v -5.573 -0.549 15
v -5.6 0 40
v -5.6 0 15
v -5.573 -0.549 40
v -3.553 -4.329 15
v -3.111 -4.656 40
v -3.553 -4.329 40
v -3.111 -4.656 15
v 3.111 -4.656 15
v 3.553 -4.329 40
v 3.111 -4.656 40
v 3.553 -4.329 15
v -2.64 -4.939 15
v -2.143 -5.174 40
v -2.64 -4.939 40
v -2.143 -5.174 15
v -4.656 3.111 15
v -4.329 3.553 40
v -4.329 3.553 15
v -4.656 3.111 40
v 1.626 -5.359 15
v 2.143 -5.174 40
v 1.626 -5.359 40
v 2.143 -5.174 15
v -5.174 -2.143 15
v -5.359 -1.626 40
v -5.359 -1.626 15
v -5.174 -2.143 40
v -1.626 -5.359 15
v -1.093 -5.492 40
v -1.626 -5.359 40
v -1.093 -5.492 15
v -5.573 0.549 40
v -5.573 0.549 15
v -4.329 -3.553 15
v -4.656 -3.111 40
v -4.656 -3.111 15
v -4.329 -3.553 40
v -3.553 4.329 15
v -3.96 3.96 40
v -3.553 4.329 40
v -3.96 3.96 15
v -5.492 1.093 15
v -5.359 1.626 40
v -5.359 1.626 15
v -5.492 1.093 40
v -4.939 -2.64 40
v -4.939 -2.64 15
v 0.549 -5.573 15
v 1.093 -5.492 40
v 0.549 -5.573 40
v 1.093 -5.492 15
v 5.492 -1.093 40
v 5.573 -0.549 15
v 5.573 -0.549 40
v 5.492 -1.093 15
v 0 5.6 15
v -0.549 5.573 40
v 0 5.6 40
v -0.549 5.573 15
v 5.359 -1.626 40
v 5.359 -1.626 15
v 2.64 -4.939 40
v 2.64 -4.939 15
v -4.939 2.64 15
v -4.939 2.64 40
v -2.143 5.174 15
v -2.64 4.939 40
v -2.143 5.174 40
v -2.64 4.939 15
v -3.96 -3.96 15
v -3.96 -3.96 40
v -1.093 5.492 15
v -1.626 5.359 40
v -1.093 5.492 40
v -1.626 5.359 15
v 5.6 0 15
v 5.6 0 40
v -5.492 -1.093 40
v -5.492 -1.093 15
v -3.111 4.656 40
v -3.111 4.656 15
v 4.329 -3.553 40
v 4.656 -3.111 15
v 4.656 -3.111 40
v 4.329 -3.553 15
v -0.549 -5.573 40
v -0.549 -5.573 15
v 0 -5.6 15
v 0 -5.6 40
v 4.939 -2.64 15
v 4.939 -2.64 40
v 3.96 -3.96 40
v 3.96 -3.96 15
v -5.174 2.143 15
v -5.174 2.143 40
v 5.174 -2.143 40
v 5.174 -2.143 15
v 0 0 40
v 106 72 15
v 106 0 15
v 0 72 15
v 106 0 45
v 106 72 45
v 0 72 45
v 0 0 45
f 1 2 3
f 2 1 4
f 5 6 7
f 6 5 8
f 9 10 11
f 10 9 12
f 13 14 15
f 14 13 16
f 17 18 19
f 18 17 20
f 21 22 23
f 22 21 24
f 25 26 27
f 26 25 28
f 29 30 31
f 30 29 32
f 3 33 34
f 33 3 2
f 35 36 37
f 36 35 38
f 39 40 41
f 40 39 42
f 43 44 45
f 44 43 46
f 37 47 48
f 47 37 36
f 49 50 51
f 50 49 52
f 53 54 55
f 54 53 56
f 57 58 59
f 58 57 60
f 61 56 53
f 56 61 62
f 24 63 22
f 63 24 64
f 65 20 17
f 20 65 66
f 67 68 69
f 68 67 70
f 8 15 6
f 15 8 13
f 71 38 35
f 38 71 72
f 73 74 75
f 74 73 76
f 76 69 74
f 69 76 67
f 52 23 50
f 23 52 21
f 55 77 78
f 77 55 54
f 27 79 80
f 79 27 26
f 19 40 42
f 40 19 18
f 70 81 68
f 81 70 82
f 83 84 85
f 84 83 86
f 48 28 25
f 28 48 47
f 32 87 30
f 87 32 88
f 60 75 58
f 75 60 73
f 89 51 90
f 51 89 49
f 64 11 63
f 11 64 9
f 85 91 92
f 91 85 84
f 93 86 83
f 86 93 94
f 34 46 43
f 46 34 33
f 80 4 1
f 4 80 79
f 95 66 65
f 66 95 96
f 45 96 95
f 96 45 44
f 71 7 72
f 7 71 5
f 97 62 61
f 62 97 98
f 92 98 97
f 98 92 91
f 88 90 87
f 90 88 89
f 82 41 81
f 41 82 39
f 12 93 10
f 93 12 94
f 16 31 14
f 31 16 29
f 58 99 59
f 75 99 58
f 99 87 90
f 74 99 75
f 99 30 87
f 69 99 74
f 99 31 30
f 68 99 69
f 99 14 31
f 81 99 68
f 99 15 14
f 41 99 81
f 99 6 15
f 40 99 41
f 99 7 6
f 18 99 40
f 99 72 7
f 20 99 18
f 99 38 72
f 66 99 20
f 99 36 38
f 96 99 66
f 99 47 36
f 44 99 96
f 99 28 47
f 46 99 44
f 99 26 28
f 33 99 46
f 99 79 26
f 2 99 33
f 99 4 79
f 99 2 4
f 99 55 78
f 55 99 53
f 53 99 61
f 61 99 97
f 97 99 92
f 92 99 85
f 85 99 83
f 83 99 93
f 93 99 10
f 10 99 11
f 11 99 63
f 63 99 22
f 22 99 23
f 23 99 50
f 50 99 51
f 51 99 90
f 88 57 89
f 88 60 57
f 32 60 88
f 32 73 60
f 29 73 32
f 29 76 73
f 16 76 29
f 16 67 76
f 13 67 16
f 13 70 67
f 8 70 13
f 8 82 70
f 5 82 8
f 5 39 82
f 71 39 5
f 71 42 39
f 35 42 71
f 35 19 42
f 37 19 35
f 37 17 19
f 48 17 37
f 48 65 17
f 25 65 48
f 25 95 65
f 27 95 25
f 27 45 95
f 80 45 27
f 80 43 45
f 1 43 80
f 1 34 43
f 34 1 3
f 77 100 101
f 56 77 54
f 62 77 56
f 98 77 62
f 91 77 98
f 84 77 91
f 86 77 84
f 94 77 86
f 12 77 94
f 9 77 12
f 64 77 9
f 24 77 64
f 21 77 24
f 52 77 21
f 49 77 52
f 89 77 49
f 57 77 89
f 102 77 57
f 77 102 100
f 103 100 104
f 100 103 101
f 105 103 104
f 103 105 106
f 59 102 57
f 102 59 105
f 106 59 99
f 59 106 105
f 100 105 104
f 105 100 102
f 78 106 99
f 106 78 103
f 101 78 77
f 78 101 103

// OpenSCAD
// Bench Rack for 1.5 mL Microcentrifuge Tubes
// Dimensions based on user specifications

// Block Dimensions
BLOCK_LENGTH_X = 106; // mm
BLOCK_WIDTH_Y = 72;   // mm
BLOCK_HEIGHT_Z = 30;  // mm

// Grid Configuration
NUM_ROWS_Y = 4;       // Rows along Y
NUM_COLS_X = 6;       // Columns along X
GRID_SPACING_X = 16;  // mm centre-to-centre
GRID_SPACING_Y = 16;  // mm centre-to-centre

// Hole Dimensions
HOLE_DIAMETER = 11.2; // mm
HOLE_DEPTH = 25;      // mm (open top, closed bottom)
FLOOR_HEIGHT = 5;     // mm (solid floor at bottom)

// Tolerance for cutting operations (to ensure clean removal)
CUT_TOLERANCE = 0.1;  // mm

// Set global faceting for smooth curves
$fn = 64;

// Calculate grid offsets to center the grid on the block
// Total span X = (NUM_COLS_X - 1) * GRID_SPACING_X
// Offset X = (BLOCK_LENGTH_X - Total span X) / 2
GRID_OFFSET_X = (BLOCK_LENGTH_X - (NUM_COLS_X - 1) * GRID_SPACING_X) / 2;

// Total span Y = (NUM_ROWS_Y - 1) * GRID_SPACING_Y
// Offset Y = (BLOCK_WIDTH_Y - Total span Y) / 2
GRID_OFFSET_Y = (BLOCK_WIDTH_Y - (NUM_ROWS_Y - 1) * GRID_SPACING_Y) / 2;

// Main Block
difference() {
    // Create the solid rectangular block
    // Translate to ensure bottom is at Z=0
    translate([0, 0, BLOCK_HEIGHT_Z / 2]) {
        cube([BLOCK_LENGTH_X, BLOCK_WIDTH_Y, BLOCK_HEIGHT_Z]);
        
        // Create holes
        // We use a loop to generate cylinders that cut through the block
        for (r = [0 : NUM_ROWS_Y - 1]) {
            for (c = [0 : NUM_COLS_X - 1]) {
                // Calculate position of each hole center
                pos_x = GRID_OFFSET_X + c * GRID_SPACING_X;
                pos_y = GRID_OFFSET_Y + r * GRID_SPACING_Y;
                
                // Define the cutting cylinder
                // Radius is half diameter
                // Height is exactly the required hole depth (25mm)
                // Z position: Top of cylinder at block top (BLOCK_HEIGHT_Z / 2)
                // Bottom of cylinder at (BLOCK_HEIGHT_Z / 2) - HOLE_DEPTH
                cylinder(
                    h = HOLE_DEPTH,
                    r = HOLE_DIAMETER / 2,
                    center = [pos_x, pos_y, BLOCK_HEIGHT_Z / 2 - HOLE_DEPTH / 2],
                    $fn = 64
                );
            }
        }
    }
}
